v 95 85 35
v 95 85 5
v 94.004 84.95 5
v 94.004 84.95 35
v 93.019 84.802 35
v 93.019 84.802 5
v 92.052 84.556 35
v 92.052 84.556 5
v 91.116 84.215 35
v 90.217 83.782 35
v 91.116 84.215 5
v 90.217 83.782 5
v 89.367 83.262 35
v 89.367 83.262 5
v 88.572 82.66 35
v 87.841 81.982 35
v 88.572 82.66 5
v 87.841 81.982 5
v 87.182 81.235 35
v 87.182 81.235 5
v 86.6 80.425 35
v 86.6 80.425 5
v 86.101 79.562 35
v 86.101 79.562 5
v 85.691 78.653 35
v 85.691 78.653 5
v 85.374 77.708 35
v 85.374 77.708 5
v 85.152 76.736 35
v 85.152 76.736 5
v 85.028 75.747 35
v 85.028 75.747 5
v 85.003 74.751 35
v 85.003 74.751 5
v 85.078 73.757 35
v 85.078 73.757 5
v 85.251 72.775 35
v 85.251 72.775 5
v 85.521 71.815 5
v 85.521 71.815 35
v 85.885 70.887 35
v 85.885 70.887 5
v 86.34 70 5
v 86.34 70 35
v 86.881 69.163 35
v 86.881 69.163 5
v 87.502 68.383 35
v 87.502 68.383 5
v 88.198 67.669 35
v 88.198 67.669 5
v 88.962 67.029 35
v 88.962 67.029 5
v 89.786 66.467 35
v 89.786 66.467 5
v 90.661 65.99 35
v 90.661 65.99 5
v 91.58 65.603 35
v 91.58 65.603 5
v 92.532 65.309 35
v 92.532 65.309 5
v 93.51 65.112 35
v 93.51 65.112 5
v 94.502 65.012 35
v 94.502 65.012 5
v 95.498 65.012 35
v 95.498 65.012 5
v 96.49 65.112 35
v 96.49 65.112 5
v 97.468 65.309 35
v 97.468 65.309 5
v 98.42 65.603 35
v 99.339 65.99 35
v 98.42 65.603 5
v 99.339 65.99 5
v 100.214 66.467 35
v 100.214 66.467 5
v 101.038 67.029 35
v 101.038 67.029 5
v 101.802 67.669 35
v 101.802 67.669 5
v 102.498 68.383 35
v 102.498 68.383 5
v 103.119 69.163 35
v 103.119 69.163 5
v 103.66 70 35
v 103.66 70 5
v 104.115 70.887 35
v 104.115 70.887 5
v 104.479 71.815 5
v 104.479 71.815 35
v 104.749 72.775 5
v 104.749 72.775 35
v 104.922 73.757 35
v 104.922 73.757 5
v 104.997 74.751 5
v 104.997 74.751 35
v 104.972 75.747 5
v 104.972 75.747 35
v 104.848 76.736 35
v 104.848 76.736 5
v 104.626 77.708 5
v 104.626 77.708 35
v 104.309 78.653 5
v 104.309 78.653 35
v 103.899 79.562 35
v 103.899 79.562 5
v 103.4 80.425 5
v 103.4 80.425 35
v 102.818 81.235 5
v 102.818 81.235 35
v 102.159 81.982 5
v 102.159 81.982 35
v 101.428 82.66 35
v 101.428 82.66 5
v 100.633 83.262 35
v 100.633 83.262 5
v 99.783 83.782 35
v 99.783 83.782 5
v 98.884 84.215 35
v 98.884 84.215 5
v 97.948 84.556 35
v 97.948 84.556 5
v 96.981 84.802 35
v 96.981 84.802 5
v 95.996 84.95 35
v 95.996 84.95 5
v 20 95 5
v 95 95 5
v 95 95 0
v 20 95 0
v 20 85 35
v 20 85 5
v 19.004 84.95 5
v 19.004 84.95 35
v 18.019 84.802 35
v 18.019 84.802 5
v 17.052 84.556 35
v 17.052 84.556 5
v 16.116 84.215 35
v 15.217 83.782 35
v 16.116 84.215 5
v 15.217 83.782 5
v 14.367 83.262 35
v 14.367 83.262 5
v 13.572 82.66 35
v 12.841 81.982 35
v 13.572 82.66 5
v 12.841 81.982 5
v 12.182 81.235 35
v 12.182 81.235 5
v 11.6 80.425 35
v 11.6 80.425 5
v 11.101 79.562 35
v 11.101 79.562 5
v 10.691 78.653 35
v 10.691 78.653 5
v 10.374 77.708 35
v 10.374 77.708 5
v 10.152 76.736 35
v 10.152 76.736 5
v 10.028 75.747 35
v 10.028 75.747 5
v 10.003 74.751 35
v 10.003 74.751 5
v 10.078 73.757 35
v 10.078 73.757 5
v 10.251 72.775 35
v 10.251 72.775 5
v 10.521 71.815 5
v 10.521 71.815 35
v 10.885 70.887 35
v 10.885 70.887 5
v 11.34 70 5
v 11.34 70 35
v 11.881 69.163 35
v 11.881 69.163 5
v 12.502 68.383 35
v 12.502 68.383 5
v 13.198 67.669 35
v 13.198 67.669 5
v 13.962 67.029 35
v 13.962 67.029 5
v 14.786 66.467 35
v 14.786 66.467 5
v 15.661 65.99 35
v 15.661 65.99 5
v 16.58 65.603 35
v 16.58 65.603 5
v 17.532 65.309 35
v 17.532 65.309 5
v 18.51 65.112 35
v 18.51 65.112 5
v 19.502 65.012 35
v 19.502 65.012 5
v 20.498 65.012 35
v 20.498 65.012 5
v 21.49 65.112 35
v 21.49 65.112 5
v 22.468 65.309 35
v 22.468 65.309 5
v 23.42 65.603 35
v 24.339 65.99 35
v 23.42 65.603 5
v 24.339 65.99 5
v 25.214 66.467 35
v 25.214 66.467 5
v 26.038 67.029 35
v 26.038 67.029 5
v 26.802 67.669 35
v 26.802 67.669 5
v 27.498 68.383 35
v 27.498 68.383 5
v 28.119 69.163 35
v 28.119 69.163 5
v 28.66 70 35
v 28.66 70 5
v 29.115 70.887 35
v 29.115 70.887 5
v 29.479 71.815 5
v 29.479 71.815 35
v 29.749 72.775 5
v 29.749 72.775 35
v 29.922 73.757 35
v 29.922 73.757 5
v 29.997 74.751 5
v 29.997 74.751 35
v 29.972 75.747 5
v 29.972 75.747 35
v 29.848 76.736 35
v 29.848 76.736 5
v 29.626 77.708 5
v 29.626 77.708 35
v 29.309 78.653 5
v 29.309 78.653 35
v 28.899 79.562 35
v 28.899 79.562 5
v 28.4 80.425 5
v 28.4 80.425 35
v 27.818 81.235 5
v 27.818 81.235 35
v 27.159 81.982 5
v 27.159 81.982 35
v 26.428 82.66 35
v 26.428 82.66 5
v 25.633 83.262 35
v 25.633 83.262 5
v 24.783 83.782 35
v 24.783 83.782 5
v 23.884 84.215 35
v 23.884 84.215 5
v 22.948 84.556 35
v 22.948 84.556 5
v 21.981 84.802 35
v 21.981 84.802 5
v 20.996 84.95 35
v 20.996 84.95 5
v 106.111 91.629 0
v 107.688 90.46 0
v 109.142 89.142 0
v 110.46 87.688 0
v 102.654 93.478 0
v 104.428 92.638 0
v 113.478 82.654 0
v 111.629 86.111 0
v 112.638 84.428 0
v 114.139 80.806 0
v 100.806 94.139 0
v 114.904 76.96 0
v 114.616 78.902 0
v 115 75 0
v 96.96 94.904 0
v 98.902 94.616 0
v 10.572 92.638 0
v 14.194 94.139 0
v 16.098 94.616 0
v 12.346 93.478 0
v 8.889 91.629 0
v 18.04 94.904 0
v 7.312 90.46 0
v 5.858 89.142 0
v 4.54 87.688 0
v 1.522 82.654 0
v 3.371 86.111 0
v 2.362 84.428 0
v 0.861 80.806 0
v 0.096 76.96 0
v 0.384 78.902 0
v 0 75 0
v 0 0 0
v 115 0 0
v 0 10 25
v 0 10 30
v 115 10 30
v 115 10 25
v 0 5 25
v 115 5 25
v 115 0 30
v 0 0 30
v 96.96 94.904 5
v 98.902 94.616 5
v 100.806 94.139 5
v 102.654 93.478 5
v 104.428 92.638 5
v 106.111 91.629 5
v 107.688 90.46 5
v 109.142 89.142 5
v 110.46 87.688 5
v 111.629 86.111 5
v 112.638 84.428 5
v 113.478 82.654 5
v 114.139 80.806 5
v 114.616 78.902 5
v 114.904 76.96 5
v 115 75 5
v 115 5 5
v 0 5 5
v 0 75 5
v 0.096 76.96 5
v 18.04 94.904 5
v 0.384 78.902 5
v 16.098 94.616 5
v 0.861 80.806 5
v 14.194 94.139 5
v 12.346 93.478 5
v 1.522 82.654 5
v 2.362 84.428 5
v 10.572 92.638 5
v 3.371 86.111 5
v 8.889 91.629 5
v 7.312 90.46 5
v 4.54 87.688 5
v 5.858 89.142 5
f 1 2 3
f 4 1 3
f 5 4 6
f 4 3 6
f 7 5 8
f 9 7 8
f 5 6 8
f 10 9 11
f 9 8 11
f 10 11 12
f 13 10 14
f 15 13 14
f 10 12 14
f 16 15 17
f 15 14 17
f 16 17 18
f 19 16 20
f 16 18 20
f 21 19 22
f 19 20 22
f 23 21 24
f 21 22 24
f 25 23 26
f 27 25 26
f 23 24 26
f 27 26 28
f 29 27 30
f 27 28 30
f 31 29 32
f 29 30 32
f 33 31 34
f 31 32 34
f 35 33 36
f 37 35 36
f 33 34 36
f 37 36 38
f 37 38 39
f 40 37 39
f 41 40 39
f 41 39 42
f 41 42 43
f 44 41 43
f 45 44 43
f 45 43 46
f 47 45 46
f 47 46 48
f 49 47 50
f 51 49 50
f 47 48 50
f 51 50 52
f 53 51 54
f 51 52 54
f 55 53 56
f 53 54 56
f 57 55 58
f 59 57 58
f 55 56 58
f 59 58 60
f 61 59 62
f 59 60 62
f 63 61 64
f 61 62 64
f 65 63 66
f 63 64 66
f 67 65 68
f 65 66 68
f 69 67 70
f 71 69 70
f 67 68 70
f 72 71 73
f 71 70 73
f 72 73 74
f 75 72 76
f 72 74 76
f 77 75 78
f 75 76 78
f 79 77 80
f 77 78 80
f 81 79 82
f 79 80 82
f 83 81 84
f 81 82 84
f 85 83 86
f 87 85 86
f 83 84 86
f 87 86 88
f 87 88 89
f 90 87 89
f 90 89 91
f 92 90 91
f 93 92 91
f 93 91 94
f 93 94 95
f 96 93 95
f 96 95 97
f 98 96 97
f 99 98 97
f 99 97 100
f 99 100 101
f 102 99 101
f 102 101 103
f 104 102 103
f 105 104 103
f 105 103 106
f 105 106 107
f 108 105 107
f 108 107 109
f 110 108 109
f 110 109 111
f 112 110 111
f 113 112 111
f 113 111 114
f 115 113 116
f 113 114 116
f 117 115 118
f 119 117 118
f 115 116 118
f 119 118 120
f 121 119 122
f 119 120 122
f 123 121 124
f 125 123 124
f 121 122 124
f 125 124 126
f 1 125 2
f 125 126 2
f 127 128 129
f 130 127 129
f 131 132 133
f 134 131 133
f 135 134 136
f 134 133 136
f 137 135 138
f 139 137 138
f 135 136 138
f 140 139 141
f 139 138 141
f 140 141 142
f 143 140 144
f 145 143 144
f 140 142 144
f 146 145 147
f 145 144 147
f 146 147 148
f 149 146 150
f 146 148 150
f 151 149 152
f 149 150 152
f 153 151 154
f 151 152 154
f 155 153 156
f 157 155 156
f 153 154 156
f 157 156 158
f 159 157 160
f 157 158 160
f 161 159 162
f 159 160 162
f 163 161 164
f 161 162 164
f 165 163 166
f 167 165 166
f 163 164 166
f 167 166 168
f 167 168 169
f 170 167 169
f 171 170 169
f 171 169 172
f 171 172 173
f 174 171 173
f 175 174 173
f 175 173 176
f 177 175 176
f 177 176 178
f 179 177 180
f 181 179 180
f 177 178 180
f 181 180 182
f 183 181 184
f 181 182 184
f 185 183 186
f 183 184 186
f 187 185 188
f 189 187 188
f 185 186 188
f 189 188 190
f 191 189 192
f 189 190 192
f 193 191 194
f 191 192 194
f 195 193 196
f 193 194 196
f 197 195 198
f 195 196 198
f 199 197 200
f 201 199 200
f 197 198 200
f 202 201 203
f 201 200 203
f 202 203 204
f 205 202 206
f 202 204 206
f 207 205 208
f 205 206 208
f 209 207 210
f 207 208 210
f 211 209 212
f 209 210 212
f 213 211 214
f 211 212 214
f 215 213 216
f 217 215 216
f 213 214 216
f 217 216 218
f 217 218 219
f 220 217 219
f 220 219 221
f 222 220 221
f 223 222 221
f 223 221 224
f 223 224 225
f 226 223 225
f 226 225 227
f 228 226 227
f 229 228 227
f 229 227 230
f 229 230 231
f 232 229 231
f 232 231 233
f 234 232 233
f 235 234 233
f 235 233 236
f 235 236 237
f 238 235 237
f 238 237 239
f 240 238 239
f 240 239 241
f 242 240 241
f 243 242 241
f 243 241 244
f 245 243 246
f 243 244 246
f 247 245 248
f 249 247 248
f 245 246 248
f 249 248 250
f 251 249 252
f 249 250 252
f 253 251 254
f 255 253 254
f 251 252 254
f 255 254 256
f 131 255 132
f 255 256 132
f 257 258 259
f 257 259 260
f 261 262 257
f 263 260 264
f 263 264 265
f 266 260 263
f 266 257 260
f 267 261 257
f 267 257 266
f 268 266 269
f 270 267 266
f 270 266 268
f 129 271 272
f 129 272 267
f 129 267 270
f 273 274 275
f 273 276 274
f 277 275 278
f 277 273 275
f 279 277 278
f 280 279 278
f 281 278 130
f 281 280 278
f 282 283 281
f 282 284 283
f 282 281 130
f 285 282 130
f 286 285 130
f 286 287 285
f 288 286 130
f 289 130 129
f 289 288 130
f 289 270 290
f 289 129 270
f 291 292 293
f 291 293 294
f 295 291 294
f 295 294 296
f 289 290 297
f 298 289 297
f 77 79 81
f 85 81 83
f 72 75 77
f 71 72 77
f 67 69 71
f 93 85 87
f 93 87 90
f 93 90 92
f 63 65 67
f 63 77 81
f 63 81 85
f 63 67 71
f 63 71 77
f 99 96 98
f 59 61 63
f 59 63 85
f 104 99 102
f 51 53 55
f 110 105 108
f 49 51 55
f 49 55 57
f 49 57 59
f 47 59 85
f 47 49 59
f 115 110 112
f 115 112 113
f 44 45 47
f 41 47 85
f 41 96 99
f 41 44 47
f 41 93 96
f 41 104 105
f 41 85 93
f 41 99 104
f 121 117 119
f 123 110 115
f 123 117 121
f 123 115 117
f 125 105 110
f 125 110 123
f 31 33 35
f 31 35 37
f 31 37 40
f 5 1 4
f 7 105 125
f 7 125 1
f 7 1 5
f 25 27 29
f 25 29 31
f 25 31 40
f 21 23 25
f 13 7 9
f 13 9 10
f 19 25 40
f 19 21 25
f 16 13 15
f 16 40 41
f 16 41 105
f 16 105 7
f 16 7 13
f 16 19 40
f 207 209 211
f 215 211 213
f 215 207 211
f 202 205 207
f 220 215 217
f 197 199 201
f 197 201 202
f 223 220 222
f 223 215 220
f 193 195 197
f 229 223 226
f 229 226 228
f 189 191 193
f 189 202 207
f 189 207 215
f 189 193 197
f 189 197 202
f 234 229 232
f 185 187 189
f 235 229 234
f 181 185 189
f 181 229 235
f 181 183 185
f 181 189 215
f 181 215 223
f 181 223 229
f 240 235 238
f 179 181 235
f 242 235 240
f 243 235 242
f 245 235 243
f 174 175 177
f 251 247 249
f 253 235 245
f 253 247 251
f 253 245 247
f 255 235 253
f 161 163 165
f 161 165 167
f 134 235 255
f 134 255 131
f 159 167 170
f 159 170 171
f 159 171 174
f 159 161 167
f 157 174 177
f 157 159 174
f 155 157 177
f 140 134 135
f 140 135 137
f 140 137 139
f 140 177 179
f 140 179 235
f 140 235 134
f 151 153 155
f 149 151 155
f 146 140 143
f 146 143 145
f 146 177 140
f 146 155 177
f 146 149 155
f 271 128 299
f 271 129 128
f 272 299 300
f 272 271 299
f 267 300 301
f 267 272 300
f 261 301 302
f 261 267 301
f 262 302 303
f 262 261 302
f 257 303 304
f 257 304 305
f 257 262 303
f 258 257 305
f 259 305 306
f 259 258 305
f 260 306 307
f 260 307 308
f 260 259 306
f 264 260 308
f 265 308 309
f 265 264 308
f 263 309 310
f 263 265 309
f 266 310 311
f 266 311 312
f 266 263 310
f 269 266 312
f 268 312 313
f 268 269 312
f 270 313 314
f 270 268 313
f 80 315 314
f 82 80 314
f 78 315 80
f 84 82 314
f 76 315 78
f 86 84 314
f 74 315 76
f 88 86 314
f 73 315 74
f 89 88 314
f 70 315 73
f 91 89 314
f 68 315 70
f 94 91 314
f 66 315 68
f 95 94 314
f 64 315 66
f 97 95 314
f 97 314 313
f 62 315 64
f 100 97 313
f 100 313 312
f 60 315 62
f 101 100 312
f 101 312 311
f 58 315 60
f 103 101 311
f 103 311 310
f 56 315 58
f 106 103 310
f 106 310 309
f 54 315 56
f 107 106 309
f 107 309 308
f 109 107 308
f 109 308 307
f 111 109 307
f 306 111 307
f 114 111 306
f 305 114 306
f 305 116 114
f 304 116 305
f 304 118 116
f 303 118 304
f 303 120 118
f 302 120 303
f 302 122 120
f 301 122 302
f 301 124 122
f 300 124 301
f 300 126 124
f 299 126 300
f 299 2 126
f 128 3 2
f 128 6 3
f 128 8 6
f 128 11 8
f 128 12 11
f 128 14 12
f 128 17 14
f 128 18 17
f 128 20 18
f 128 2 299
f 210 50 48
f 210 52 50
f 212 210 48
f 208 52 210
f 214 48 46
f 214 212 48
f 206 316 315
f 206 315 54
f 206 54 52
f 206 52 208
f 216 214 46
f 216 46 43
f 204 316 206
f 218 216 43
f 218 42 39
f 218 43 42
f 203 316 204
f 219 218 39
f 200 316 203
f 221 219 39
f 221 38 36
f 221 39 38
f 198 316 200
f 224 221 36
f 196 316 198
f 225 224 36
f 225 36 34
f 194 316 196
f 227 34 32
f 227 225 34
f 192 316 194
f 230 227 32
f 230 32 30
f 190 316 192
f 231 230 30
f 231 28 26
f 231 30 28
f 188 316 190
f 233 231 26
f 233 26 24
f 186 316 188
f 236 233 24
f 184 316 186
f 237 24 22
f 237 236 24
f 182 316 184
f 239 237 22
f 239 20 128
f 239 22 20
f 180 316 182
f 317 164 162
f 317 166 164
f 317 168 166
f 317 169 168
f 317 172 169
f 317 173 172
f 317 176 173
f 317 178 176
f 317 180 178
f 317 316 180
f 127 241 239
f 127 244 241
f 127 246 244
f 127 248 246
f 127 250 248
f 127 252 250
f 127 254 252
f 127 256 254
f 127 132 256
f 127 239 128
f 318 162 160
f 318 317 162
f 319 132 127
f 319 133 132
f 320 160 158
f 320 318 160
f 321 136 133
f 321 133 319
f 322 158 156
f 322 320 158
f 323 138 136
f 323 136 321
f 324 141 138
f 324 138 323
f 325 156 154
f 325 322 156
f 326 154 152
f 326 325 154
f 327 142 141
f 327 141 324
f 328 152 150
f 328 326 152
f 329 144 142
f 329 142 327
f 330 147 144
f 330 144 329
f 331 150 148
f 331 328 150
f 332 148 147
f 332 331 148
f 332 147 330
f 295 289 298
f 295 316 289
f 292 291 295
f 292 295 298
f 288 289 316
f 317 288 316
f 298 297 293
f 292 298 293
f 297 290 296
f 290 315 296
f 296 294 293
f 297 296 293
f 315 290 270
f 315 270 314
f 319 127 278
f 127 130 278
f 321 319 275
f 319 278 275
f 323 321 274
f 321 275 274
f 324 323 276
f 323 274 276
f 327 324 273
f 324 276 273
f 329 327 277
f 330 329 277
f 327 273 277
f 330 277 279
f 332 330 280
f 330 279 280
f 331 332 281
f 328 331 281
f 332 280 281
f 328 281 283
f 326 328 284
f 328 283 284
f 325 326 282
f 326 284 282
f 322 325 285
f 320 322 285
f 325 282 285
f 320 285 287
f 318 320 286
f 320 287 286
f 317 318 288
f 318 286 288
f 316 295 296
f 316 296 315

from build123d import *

# Parameters (mm, degrees)
EXTRUDE_THIN1_DEPTH = 115
FILLET1_R           = 20
SKETCH2_R           = 10
BOSS_EXTRUDE1_DEPTH = 30


with BuildPart() as part:
    # Sketch1 → Extrude-Thin1 (new body)
    with BuildSketch(Plane(origin=(0, 0, 0), x_dir=(0, 0, -1), z_dir=(1, 0, 0))):
        Polygon((0, 95), (0, 0), (-30, 0), (-30, 10), (-25, 10), (-25, 5), (-5, 5), (-5, 95), align=None)
    extrude(amount=EXTRUDE_THIN1_DEPTH)

    # Fillet1
    fillet1_edges = [part.edges().sort_by_distance(p)[0] for p in [
        (115, 95, 2.5),
        (0, 95, 2.5),
    ]]
    fillet(fillet1_edges, radius=FILLET1_R)

    # Sketch2 → Boss-Extrude1 (add)
    with BuildSketch(Plane.XY.offset(5)):
        with Locations(Location((20, 75, 0), (0, 0, 90))):
            Circle(SKETCH2_R)
        with Locations(Location((95, 75, 0), (0, 0, 90))):
            Circle(SKETCH2_R)
    extrude(amount=BOSS_EXTRUDE1_DEPTH)


solid = part.part
